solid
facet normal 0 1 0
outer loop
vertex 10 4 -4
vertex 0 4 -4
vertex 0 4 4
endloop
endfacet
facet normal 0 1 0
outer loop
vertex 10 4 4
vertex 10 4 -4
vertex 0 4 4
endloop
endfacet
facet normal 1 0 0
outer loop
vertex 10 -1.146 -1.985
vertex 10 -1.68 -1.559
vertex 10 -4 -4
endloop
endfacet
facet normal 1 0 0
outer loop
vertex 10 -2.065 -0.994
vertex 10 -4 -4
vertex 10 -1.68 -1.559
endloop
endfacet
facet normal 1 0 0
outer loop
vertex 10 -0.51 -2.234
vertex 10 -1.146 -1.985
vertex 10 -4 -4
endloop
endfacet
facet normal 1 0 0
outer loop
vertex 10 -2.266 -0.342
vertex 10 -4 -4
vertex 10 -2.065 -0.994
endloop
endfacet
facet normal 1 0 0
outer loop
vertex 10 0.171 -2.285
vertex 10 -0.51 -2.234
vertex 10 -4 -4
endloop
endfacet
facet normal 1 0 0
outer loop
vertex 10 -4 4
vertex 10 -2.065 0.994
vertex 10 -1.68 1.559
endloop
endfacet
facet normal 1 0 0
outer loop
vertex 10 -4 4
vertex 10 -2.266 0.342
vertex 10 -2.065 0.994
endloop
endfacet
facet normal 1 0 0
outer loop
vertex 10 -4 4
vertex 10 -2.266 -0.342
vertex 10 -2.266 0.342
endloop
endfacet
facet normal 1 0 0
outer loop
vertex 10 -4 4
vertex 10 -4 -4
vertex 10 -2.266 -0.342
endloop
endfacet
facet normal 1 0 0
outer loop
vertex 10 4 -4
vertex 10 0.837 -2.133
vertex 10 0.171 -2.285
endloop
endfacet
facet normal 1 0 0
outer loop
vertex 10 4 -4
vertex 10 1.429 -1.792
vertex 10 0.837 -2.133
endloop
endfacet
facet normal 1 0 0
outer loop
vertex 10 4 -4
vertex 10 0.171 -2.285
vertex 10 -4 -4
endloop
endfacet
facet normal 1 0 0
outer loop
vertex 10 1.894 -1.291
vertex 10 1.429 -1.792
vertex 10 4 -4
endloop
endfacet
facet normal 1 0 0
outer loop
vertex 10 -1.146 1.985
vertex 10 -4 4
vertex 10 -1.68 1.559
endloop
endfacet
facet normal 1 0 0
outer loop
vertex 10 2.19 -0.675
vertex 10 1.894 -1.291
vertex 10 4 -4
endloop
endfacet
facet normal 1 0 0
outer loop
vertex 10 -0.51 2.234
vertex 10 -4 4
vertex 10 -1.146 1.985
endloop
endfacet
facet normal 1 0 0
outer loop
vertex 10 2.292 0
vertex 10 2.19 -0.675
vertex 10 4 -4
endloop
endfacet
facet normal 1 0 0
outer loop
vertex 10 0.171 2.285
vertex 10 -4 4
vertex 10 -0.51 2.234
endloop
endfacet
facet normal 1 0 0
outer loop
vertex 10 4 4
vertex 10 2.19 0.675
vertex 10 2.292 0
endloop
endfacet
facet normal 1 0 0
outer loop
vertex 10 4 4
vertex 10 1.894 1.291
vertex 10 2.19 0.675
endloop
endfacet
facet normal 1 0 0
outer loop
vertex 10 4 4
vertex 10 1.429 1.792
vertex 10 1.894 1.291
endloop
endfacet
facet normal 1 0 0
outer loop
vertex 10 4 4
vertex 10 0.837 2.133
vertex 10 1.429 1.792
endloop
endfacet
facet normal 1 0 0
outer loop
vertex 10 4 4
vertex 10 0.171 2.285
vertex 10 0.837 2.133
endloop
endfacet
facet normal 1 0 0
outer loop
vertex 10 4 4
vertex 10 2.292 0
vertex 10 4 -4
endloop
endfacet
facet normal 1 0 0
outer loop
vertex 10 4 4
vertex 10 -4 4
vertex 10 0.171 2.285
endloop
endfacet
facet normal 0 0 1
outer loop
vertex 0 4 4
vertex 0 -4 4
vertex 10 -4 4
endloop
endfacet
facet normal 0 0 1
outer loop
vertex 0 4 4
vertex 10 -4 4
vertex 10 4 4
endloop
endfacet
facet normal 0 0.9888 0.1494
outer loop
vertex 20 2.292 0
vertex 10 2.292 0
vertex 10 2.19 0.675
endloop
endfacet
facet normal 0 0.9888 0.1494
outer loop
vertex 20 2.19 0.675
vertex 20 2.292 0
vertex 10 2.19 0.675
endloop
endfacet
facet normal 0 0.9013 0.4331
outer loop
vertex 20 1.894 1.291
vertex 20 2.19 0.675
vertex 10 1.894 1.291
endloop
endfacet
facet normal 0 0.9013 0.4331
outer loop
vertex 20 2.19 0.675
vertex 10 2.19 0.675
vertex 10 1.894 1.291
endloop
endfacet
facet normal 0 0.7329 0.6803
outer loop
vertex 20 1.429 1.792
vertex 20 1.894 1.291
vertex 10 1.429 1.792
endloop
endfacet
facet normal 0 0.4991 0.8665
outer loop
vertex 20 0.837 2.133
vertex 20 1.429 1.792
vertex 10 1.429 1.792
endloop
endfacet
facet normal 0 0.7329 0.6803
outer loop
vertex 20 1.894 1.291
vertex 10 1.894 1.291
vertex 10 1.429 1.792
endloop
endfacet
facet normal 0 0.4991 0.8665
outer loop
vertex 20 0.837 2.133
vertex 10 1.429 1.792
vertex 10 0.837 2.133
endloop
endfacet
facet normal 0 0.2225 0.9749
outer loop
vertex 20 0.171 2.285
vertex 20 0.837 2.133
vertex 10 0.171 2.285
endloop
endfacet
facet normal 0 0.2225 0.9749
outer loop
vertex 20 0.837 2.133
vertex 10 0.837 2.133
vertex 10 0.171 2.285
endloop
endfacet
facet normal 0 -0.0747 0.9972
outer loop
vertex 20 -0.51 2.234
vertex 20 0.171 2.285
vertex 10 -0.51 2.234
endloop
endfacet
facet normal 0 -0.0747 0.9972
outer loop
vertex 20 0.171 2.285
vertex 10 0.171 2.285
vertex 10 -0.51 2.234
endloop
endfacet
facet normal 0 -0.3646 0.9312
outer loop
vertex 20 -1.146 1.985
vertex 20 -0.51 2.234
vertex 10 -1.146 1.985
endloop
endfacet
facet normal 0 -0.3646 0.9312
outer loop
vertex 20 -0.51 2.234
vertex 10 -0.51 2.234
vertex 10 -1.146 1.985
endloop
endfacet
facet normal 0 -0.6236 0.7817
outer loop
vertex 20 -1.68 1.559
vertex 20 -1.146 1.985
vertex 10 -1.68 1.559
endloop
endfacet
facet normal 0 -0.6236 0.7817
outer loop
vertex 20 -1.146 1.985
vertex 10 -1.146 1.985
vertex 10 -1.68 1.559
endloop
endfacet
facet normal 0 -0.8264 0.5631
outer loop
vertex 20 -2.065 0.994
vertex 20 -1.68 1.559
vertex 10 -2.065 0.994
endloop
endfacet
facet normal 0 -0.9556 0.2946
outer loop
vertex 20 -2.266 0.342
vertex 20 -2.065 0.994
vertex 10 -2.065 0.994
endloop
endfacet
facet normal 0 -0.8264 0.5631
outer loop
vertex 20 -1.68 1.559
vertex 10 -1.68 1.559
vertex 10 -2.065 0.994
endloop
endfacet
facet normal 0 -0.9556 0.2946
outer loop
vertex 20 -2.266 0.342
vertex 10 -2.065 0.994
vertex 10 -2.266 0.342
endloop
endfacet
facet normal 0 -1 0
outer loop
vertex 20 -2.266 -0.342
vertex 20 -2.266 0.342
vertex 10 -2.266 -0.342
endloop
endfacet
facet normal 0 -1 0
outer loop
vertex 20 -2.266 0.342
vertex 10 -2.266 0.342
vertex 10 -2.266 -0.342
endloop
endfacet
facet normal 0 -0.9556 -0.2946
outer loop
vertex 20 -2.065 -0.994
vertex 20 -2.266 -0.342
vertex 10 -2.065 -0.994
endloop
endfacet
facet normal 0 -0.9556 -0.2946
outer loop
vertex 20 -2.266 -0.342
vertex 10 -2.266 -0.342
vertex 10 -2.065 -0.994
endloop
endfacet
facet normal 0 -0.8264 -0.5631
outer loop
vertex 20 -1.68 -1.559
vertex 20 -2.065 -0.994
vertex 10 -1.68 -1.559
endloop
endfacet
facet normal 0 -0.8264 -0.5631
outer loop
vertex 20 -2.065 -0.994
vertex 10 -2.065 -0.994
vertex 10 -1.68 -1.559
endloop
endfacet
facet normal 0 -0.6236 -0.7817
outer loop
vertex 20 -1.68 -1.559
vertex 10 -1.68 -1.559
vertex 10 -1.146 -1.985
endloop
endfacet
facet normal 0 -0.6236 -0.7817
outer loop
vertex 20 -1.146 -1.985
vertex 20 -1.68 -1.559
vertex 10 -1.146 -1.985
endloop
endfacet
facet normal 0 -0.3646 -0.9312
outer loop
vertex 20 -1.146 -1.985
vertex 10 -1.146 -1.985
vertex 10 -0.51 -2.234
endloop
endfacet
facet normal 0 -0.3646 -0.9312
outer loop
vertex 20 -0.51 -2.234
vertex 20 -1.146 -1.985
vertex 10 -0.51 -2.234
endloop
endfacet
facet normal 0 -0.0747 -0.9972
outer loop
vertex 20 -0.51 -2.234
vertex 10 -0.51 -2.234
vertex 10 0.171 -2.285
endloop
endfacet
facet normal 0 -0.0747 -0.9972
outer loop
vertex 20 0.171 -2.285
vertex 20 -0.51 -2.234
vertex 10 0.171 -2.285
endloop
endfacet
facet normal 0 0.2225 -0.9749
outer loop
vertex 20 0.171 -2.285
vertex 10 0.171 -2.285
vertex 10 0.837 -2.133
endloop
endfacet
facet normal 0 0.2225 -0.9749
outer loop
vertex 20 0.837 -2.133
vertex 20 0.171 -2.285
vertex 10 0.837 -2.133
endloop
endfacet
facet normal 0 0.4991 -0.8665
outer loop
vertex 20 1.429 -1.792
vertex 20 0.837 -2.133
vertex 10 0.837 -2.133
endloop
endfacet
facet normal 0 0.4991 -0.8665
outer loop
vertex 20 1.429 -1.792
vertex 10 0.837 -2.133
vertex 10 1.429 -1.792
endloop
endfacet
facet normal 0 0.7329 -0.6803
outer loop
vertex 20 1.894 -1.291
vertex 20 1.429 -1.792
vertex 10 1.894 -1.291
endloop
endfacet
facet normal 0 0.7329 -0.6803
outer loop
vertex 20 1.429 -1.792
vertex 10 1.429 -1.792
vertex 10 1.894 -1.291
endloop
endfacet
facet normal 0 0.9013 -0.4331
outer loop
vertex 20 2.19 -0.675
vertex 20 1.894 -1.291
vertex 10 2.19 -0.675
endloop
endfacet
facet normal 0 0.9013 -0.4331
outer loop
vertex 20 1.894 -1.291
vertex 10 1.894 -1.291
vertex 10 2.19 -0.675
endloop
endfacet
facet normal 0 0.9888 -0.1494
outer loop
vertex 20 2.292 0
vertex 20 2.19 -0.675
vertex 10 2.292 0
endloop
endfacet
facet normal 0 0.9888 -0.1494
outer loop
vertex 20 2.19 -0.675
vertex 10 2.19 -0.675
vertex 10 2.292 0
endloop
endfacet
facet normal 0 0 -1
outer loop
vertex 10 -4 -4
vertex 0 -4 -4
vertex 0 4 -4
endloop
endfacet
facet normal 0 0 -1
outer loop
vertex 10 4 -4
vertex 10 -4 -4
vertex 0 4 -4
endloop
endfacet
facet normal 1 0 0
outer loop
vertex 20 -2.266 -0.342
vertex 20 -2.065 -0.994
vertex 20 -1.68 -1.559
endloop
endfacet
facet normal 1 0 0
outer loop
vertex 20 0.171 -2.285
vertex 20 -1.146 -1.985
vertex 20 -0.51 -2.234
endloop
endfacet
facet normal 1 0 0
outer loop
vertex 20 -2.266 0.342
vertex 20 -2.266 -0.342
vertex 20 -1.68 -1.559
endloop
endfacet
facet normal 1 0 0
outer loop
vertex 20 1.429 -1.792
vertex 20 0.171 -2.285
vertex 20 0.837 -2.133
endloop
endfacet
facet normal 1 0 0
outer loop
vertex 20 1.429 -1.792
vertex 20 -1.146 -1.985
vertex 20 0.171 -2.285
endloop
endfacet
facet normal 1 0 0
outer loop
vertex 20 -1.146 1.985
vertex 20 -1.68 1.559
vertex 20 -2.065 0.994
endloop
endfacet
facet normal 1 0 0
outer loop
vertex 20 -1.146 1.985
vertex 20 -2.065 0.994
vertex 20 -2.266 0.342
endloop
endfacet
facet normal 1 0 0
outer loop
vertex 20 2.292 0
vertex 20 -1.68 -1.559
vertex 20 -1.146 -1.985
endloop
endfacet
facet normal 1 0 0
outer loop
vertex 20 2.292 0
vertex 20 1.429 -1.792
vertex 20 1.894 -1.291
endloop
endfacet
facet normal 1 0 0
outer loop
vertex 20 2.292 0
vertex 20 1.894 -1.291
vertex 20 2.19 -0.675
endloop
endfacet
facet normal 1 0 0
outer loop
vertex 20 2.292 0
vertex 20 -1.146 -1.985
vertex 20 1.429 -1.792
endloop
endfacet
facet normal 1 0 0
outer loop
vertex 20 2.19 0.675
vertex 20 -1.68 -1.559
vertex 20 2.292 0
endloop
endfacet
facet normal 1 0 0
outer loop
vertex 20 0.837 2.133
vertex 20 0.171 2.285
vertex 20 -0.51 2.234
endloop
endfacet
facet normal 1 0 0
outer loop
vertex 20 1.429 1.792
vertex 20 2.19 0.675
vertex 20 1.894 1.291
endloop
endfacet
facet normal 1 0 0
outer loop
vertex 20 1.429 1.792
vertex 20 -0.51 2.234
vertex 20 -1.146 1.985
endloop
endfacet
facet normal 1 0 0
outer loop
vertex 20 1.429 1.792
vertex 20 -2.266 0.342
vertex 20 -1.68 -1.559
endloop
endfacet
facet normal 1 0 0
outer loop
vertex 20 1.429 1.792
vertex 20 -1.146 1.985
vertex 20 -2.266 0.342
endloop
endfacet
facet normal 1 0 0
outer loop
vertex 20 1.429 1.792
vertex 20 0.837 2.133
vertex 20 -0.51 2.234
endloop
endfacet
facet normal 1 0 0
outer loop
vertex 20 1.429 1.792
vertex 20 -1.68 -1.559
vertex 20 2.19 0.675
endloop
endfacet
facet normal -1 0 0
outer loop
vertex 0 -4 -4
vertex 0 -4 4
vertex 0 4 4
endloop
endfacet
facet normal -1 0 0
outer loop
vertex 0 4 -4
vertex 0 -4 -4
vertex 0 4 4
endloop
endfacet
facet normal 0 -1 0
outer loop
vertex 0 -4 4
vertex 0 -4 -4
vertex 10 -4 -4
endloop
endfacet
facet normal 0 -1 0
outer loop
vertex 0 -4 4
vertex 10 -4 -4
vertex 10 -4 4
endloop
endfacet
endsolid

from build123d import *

# Parameters (mm, degrees)
SKETCH_W     = 8
SKETCH_H     = 8
PAD_DEPTH    = 10
SKETCH001_R  = 2.291718
PAD001_DEPTH = 10


with BuildPart() as part:
    # Sketch → Pad (new body)
    with BuildSketch(Plane.YZ):
        Rectangle(SKETCH_W, SKETCH_H)
    extrude(amount=PAD_DEPTH)

    # Sketch001 (on Face6 of Pad) → Pad001 (join)
    with BuildSketch(Plane.YZ.offset(10)):
        Circle(SKETCH001_R)
    extrude(amount=PAD001_DEPTH)


solid = part.part
